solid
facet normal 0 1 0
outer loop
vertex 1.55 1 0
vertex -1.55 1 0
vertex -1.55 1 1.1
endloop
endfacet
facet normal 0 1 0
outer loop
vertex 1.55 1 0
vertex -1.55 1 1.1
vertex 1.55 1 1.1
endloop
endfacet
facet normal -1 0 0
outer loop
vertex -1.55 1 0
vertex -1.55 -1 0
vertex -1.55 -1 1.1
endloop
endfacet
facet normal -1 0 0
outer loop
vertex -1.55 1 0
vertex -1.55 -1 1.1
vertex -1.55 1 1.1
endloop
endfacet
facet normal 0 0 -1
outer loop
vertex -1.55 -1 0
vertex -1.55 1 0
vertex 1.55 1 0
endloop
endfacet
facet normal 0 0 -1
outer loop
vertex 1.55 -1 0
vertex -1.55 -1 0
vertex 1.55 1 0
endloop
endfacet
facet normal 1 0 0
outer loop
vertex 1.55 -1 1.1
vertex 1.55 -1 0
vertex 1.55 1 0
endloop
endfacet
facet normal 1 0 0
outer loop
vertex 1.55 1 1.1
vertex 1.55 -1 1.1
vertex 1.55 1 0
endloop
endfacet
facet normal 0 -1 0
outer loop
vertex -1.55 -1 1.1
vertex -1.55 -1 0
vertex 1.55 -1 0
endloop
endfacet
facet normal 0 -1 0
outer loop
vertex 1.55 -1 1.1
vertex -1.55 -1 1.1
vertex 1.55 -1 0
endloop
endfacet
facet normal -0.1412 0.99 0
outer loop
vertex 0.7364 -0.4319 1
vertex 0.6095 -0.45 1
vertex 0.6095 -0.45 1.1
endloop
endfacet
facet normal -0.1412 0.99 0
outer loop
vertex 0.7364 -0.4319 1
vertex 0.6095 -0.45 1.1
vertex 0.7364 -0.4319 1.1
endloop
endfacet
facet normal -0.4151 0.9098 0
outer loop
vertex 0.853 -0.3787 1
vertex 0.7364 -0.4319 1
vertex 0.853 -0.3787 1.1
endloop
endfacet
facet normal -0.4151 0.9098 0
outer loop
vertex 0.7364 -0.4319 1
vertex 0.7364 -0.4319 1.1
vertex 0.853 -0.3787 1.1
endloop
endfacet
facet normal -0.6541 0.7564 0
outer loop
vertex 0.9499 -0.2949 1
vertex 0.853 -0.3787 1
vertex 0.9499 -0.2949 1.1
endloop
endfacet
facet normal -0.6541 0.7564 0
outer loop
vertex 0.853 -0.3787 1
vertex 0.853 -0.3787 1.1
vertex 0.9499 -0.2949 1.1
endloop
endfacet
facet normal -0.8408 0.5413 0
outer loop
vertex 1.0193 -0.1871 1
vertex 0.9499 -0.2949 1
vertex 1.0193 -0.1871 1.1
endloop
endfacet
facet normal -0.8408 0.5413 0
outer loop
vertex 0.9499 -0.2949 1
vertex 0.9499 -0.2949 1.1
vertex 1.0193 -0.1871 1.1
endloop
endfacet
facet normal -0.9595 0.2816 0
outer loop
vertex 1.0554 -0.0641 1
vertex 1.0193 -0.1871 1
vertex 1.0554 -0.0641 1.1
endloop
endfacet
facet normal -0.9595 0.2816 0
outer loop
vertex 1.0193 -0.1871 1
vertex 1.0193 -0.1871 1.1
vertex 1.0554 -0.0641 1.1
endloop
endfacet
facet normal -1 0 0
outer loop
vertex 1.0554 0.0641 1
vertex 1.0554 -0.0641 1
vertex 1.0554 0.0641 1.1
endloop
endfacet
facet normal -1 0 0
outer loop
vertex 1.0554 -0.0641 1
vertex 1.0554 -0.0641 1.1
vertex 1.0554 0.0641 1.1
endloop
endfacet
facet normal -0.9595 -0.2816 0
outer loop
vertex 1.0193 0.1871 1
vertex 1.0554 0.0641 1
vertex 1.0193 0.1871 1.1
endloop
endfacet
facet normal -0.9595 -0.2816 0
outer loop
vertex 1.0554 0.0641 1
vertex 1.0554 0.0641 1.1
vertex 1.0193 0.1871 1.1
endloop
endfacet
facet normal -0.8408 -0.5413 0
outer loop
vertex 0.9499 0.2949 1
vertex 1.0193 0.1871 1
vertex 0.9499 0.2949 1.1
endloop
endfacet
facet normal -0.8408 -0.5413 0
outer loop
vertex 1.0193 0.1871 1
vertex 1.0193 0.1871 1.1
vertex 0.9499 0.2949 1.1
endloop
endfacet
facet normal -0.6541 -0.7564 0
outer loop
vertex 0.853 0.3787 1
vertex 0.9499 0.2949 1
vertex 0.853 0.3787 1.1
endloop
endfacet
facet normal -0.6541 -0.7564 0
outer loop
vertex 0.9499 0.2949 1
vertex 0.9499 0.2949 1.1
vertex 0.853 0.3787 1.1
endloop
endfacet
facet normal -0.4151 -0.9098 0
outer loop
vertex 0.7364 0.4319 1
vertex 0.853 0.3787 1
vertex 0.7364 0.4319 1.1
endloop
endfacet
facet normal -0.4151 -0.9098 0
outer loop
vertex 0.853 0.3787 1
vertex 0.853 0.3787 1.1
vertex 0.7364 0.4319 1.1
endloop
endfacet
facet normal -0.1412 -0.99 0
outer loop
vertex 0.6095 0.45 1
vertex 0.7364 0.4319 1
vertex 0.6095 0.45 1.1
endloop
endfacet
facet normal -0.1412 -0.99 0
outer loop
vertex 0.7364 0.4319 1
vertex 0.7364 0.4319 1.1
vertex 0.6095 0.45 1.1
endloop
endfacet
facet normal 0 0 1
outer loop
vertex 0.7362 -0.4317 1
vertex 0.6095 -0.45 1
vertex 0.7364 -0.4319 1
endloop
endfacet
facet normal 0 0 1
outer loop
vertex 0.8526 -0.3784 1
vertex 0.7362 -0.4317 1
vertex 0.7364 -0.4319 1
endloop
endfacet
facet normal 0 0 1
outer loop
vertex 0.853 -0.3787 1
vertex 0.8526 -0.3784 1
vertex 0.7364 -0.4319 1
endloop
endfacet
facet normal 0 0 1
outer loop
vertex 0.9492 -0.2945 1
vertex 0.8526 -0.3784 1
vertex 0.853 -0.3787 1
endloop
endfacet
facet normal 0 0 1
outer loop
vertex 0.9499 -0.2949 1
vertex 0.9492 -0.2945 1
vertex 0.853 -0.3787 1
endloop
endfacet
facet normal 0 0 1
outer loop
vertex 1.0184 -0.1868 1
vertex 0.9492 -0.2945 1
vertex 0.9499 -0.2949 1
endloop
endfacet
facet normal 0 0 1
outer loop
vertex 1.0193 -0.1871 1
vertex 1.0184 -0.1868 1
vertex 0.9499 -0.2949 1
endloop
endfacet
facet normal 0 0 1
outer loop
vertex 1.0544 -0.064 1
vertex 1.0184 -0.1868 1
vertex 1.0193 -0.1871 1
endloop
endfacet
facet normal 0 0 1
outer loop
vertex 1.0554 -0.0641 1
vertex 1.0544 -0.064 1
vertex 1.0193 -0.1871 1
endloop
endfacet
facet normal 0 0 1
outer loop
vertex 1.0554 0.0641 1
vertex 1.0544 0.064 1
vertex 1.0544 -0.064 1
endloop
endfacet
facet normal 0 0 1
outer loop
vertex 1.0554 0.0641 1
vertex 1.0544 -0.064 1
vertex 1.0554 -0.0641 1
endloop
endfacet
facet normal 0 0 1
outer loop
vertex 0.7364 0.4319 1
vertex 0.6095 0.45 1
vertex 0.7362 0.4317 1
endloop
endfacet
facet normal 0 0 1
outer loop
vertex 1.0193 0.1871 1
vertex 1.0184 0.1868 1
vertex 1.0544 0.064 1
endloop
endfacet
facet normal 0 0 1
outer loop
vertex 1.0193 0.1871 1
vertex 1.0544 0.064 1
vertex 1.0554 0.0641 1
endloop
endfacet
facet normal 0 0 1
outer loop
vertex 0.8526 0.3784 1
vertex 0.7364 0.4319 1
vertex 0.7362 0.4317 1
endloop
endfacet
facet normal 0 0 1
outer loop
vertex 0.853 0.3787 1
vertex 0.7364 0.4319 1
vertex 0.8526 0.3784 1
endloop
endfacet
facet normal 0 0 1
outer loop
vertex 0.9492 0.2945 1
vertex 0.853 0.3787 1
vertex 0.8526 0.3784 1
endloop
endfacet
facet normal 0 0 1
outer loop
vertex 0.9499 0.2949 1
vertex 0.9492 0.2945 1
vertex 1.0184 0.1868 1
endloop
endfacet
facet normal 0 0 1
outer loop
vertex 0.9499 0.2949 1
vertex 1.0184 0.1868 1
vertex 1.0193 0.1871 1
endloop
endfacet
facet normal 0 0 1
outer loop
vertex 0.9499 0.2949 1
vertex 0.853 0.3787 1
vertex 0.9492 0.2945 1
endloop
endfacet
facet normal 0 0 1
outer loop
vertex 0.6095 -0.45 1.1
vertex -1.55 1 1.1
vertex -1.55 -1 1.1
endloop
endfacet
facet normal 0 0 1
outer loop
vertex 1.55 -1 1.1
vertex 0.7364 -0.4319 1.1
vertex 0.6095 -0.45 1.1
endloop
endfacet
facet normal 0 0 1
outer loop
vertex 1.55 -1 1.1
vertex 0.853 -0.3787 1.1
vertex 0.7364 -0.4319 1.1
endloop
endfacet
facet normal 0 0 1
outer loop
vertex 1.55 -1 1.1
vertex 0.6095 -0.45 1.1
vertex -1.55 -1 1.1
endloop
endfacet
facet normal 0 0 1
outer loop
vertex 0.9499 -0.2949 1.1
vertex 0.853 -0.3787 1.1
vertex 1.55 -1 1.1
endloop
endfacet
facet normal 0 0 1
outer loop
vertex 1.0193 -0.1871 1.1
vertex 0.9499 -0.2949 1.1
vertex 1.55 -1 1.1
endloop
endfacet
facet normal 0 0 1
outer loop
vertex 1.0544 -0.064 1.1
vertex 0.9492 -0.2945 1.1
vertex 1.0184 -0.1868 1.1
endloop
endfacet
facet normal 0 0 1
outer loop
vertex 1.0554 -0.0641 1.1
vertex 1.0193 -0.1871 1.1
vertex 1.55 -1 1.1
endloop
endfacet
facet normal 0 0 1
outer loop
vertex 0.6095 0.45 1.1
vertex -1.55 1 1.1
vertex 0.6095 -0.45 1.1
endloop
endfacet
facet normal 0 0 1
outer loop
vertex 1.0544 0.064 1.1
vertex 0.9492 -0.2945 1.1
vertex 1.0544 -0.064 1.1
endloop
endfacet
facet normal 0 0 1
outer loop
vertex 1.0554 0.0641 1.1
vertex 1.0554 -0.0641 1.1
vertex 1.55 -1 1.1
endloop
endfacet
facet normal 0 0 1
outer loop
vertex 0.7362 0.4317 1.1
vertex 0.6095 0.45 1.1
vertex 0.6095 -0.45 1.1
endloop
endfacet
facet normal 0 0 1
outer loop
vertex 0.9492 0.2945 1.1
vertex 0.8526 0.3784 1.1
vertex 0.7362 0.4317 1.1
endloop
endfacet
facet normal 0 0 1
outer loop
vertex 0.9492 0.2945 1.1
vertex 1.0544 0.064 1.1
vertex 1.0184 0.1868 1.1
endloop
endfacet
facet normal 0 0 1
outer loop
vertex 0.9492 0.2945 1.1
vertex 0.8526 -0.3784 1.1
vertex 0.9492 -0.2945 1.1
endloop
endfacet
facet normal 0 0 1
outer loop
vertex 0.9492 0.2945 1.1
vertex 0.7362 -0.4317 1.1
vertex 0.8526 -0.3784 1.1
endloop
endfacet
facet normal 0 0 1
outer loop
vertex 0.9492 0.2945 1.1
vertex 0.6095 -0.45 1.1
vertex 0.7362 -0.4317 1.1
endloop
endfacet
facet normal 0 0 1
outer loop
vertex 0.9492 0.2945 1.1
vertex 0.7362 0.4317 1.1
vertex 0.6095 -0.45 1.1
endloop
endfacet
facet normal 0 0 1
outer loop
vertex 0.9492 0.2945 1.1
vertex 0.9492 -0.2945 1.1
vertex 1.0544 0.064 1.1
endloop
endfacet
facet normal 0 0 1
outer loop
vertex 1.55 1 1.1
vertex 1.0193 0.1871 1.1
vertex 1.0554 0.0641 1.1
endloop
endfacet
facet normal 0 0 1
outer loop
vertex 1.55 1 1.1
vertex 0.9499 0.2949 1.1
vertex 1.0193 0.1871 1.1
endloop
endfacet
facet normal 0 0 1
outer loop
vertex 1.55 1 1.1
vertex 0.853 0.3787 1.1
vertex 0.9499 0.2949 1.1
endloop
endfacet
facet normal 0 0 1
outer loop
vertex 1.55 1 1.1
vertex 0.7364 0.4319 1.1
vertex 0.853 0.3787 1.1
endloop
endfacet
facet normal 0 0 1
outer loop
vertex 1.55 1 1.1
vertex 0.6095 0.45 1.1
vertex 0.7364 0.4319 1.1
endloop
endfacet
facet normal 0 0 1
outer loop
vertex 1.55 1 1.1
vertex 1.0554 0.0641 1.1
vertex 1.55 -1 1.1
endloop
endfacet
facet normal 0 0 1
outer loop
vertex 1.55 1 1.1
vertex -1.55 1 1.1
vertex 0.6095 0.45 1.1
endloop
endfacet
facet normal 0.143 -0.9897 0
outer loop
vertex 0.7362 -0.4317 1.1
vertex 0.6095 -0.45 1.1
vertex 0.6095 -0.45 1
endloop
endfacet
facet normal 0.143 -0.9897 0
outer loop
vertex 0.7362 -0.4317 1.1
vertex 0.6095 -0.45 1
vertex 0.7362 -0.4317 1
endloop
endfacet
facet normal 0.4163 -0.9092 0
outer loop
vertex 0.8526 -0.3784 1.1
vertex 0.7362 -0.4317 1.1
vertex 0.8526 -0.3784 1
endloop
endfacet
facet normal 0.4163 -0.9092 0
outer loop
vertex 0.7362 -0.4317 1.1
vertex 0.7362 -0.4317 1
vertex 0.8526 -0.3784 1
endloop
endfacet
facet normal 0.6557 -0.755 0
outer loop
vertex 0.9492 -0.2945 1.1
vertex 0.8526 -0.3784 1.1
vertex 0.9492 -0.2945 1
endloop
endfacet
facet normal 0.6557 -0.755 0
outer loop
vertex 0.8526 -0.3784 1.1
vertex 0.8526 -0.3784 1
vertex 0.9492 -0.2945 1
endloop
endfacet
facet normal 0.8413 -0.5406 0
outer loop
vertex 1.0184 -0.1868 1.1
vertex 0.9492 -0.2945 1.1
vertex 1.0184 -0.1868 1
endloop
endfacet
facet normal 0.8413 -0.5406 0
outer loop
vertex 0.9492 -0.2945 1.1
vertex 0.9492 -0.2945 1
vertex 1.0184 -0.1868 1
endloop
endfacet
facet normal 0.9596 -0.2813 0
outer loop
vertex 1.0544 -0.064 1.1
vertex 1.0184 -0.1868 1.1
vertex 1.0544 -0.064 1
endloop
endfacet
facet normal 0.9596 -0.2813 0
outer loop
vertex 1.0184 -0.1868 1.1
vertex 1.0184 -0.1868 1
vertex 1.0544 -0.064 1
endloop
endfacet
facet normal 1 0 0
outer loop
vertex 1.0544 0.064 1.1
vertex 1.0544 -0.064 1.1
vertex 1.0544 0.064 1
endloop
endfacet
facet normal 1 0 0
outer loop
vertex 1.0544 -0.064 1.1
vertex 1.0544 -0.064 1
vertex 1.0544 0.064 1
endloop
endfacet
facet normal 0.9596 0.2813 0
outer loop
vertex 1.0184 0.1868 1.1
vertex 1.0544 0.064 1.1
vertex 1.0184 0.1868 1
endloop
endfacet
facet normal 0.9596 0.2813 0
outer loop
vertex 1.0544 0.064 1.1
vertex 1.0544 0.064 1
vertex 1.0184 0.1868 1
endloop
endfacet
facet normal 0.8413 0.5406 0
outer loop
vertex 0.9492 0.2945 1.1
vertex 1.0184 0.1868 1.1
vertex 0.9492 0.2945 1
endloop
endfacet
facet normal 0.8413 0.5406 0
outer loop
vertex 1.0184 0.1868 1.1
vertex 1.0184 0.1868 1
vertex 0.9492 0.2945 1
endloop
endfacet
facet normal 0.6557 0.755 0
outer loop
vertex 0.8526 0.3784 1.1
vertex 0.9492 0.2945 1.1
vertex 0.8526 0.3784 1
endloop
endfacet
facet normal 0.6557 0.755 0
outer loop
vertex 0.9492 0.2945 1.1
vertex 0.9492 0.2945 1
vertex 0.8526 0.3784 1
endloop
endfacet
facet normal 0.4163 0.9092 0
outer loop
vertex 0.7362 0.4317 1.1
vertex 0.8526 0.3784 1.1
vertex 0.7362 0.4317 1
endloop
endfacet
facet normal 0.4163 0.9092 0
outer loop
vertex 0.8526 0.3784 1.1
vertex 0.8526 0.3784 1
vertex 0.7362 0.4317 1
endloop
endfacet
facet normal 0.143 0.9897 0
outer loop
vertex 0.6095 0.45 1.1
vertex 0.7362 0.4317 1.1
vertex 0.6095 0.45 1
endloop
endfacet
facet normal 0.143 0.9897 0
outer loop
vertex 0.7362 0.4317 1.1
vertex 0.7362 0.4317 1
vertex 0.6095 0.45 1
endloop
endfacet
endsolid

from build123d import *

# Parameters (mm, degrees)
SKETCH001_R  = 0.45
PAD001_DEPTH = 0.1
SKETCH_W     = 3.1
SKETCH_H     = 2
PAD_DEPTH    = 1.1
CIRCLE_R     = 0.45
POCKET_DEPTH = 0.1


with BuildPart() as body001:
    # Sketch001 → Pad001 (new body)
    with BuildSketch(Plane.XY):
        with Locations((0.609, 0)):
            Circle(SKETCH001_R)
    extrude(amount=PAD001_DEPTH)


with BuildPart() as body001_1:
    # Body001 placement: moved
    add(body001.part.moved(Location((0, 0, 1))))


with BuildPart() as fusion:
    # Sketch → Pad (new body)
    with BuildSketch(Plane.XY):
        Rectangle(SKETCH_W, SKETCH_H)
    extrude(amount=PAD_DEPTH)

    # Circle → Pocket (cut)
    with BuildSketch(Plane(origin=(0.61, 0, 1.1), x_dir=(1, 0, 0), z_dir=(0, 0, 1))):
        Circle(CIRCLE_R)
    extrude(amount=-POCKET_DEPTH, mode=Mode.SUBTRACT)

    # Fusion: union Body001
    add(body001_1.part)


solid = fusion.part
